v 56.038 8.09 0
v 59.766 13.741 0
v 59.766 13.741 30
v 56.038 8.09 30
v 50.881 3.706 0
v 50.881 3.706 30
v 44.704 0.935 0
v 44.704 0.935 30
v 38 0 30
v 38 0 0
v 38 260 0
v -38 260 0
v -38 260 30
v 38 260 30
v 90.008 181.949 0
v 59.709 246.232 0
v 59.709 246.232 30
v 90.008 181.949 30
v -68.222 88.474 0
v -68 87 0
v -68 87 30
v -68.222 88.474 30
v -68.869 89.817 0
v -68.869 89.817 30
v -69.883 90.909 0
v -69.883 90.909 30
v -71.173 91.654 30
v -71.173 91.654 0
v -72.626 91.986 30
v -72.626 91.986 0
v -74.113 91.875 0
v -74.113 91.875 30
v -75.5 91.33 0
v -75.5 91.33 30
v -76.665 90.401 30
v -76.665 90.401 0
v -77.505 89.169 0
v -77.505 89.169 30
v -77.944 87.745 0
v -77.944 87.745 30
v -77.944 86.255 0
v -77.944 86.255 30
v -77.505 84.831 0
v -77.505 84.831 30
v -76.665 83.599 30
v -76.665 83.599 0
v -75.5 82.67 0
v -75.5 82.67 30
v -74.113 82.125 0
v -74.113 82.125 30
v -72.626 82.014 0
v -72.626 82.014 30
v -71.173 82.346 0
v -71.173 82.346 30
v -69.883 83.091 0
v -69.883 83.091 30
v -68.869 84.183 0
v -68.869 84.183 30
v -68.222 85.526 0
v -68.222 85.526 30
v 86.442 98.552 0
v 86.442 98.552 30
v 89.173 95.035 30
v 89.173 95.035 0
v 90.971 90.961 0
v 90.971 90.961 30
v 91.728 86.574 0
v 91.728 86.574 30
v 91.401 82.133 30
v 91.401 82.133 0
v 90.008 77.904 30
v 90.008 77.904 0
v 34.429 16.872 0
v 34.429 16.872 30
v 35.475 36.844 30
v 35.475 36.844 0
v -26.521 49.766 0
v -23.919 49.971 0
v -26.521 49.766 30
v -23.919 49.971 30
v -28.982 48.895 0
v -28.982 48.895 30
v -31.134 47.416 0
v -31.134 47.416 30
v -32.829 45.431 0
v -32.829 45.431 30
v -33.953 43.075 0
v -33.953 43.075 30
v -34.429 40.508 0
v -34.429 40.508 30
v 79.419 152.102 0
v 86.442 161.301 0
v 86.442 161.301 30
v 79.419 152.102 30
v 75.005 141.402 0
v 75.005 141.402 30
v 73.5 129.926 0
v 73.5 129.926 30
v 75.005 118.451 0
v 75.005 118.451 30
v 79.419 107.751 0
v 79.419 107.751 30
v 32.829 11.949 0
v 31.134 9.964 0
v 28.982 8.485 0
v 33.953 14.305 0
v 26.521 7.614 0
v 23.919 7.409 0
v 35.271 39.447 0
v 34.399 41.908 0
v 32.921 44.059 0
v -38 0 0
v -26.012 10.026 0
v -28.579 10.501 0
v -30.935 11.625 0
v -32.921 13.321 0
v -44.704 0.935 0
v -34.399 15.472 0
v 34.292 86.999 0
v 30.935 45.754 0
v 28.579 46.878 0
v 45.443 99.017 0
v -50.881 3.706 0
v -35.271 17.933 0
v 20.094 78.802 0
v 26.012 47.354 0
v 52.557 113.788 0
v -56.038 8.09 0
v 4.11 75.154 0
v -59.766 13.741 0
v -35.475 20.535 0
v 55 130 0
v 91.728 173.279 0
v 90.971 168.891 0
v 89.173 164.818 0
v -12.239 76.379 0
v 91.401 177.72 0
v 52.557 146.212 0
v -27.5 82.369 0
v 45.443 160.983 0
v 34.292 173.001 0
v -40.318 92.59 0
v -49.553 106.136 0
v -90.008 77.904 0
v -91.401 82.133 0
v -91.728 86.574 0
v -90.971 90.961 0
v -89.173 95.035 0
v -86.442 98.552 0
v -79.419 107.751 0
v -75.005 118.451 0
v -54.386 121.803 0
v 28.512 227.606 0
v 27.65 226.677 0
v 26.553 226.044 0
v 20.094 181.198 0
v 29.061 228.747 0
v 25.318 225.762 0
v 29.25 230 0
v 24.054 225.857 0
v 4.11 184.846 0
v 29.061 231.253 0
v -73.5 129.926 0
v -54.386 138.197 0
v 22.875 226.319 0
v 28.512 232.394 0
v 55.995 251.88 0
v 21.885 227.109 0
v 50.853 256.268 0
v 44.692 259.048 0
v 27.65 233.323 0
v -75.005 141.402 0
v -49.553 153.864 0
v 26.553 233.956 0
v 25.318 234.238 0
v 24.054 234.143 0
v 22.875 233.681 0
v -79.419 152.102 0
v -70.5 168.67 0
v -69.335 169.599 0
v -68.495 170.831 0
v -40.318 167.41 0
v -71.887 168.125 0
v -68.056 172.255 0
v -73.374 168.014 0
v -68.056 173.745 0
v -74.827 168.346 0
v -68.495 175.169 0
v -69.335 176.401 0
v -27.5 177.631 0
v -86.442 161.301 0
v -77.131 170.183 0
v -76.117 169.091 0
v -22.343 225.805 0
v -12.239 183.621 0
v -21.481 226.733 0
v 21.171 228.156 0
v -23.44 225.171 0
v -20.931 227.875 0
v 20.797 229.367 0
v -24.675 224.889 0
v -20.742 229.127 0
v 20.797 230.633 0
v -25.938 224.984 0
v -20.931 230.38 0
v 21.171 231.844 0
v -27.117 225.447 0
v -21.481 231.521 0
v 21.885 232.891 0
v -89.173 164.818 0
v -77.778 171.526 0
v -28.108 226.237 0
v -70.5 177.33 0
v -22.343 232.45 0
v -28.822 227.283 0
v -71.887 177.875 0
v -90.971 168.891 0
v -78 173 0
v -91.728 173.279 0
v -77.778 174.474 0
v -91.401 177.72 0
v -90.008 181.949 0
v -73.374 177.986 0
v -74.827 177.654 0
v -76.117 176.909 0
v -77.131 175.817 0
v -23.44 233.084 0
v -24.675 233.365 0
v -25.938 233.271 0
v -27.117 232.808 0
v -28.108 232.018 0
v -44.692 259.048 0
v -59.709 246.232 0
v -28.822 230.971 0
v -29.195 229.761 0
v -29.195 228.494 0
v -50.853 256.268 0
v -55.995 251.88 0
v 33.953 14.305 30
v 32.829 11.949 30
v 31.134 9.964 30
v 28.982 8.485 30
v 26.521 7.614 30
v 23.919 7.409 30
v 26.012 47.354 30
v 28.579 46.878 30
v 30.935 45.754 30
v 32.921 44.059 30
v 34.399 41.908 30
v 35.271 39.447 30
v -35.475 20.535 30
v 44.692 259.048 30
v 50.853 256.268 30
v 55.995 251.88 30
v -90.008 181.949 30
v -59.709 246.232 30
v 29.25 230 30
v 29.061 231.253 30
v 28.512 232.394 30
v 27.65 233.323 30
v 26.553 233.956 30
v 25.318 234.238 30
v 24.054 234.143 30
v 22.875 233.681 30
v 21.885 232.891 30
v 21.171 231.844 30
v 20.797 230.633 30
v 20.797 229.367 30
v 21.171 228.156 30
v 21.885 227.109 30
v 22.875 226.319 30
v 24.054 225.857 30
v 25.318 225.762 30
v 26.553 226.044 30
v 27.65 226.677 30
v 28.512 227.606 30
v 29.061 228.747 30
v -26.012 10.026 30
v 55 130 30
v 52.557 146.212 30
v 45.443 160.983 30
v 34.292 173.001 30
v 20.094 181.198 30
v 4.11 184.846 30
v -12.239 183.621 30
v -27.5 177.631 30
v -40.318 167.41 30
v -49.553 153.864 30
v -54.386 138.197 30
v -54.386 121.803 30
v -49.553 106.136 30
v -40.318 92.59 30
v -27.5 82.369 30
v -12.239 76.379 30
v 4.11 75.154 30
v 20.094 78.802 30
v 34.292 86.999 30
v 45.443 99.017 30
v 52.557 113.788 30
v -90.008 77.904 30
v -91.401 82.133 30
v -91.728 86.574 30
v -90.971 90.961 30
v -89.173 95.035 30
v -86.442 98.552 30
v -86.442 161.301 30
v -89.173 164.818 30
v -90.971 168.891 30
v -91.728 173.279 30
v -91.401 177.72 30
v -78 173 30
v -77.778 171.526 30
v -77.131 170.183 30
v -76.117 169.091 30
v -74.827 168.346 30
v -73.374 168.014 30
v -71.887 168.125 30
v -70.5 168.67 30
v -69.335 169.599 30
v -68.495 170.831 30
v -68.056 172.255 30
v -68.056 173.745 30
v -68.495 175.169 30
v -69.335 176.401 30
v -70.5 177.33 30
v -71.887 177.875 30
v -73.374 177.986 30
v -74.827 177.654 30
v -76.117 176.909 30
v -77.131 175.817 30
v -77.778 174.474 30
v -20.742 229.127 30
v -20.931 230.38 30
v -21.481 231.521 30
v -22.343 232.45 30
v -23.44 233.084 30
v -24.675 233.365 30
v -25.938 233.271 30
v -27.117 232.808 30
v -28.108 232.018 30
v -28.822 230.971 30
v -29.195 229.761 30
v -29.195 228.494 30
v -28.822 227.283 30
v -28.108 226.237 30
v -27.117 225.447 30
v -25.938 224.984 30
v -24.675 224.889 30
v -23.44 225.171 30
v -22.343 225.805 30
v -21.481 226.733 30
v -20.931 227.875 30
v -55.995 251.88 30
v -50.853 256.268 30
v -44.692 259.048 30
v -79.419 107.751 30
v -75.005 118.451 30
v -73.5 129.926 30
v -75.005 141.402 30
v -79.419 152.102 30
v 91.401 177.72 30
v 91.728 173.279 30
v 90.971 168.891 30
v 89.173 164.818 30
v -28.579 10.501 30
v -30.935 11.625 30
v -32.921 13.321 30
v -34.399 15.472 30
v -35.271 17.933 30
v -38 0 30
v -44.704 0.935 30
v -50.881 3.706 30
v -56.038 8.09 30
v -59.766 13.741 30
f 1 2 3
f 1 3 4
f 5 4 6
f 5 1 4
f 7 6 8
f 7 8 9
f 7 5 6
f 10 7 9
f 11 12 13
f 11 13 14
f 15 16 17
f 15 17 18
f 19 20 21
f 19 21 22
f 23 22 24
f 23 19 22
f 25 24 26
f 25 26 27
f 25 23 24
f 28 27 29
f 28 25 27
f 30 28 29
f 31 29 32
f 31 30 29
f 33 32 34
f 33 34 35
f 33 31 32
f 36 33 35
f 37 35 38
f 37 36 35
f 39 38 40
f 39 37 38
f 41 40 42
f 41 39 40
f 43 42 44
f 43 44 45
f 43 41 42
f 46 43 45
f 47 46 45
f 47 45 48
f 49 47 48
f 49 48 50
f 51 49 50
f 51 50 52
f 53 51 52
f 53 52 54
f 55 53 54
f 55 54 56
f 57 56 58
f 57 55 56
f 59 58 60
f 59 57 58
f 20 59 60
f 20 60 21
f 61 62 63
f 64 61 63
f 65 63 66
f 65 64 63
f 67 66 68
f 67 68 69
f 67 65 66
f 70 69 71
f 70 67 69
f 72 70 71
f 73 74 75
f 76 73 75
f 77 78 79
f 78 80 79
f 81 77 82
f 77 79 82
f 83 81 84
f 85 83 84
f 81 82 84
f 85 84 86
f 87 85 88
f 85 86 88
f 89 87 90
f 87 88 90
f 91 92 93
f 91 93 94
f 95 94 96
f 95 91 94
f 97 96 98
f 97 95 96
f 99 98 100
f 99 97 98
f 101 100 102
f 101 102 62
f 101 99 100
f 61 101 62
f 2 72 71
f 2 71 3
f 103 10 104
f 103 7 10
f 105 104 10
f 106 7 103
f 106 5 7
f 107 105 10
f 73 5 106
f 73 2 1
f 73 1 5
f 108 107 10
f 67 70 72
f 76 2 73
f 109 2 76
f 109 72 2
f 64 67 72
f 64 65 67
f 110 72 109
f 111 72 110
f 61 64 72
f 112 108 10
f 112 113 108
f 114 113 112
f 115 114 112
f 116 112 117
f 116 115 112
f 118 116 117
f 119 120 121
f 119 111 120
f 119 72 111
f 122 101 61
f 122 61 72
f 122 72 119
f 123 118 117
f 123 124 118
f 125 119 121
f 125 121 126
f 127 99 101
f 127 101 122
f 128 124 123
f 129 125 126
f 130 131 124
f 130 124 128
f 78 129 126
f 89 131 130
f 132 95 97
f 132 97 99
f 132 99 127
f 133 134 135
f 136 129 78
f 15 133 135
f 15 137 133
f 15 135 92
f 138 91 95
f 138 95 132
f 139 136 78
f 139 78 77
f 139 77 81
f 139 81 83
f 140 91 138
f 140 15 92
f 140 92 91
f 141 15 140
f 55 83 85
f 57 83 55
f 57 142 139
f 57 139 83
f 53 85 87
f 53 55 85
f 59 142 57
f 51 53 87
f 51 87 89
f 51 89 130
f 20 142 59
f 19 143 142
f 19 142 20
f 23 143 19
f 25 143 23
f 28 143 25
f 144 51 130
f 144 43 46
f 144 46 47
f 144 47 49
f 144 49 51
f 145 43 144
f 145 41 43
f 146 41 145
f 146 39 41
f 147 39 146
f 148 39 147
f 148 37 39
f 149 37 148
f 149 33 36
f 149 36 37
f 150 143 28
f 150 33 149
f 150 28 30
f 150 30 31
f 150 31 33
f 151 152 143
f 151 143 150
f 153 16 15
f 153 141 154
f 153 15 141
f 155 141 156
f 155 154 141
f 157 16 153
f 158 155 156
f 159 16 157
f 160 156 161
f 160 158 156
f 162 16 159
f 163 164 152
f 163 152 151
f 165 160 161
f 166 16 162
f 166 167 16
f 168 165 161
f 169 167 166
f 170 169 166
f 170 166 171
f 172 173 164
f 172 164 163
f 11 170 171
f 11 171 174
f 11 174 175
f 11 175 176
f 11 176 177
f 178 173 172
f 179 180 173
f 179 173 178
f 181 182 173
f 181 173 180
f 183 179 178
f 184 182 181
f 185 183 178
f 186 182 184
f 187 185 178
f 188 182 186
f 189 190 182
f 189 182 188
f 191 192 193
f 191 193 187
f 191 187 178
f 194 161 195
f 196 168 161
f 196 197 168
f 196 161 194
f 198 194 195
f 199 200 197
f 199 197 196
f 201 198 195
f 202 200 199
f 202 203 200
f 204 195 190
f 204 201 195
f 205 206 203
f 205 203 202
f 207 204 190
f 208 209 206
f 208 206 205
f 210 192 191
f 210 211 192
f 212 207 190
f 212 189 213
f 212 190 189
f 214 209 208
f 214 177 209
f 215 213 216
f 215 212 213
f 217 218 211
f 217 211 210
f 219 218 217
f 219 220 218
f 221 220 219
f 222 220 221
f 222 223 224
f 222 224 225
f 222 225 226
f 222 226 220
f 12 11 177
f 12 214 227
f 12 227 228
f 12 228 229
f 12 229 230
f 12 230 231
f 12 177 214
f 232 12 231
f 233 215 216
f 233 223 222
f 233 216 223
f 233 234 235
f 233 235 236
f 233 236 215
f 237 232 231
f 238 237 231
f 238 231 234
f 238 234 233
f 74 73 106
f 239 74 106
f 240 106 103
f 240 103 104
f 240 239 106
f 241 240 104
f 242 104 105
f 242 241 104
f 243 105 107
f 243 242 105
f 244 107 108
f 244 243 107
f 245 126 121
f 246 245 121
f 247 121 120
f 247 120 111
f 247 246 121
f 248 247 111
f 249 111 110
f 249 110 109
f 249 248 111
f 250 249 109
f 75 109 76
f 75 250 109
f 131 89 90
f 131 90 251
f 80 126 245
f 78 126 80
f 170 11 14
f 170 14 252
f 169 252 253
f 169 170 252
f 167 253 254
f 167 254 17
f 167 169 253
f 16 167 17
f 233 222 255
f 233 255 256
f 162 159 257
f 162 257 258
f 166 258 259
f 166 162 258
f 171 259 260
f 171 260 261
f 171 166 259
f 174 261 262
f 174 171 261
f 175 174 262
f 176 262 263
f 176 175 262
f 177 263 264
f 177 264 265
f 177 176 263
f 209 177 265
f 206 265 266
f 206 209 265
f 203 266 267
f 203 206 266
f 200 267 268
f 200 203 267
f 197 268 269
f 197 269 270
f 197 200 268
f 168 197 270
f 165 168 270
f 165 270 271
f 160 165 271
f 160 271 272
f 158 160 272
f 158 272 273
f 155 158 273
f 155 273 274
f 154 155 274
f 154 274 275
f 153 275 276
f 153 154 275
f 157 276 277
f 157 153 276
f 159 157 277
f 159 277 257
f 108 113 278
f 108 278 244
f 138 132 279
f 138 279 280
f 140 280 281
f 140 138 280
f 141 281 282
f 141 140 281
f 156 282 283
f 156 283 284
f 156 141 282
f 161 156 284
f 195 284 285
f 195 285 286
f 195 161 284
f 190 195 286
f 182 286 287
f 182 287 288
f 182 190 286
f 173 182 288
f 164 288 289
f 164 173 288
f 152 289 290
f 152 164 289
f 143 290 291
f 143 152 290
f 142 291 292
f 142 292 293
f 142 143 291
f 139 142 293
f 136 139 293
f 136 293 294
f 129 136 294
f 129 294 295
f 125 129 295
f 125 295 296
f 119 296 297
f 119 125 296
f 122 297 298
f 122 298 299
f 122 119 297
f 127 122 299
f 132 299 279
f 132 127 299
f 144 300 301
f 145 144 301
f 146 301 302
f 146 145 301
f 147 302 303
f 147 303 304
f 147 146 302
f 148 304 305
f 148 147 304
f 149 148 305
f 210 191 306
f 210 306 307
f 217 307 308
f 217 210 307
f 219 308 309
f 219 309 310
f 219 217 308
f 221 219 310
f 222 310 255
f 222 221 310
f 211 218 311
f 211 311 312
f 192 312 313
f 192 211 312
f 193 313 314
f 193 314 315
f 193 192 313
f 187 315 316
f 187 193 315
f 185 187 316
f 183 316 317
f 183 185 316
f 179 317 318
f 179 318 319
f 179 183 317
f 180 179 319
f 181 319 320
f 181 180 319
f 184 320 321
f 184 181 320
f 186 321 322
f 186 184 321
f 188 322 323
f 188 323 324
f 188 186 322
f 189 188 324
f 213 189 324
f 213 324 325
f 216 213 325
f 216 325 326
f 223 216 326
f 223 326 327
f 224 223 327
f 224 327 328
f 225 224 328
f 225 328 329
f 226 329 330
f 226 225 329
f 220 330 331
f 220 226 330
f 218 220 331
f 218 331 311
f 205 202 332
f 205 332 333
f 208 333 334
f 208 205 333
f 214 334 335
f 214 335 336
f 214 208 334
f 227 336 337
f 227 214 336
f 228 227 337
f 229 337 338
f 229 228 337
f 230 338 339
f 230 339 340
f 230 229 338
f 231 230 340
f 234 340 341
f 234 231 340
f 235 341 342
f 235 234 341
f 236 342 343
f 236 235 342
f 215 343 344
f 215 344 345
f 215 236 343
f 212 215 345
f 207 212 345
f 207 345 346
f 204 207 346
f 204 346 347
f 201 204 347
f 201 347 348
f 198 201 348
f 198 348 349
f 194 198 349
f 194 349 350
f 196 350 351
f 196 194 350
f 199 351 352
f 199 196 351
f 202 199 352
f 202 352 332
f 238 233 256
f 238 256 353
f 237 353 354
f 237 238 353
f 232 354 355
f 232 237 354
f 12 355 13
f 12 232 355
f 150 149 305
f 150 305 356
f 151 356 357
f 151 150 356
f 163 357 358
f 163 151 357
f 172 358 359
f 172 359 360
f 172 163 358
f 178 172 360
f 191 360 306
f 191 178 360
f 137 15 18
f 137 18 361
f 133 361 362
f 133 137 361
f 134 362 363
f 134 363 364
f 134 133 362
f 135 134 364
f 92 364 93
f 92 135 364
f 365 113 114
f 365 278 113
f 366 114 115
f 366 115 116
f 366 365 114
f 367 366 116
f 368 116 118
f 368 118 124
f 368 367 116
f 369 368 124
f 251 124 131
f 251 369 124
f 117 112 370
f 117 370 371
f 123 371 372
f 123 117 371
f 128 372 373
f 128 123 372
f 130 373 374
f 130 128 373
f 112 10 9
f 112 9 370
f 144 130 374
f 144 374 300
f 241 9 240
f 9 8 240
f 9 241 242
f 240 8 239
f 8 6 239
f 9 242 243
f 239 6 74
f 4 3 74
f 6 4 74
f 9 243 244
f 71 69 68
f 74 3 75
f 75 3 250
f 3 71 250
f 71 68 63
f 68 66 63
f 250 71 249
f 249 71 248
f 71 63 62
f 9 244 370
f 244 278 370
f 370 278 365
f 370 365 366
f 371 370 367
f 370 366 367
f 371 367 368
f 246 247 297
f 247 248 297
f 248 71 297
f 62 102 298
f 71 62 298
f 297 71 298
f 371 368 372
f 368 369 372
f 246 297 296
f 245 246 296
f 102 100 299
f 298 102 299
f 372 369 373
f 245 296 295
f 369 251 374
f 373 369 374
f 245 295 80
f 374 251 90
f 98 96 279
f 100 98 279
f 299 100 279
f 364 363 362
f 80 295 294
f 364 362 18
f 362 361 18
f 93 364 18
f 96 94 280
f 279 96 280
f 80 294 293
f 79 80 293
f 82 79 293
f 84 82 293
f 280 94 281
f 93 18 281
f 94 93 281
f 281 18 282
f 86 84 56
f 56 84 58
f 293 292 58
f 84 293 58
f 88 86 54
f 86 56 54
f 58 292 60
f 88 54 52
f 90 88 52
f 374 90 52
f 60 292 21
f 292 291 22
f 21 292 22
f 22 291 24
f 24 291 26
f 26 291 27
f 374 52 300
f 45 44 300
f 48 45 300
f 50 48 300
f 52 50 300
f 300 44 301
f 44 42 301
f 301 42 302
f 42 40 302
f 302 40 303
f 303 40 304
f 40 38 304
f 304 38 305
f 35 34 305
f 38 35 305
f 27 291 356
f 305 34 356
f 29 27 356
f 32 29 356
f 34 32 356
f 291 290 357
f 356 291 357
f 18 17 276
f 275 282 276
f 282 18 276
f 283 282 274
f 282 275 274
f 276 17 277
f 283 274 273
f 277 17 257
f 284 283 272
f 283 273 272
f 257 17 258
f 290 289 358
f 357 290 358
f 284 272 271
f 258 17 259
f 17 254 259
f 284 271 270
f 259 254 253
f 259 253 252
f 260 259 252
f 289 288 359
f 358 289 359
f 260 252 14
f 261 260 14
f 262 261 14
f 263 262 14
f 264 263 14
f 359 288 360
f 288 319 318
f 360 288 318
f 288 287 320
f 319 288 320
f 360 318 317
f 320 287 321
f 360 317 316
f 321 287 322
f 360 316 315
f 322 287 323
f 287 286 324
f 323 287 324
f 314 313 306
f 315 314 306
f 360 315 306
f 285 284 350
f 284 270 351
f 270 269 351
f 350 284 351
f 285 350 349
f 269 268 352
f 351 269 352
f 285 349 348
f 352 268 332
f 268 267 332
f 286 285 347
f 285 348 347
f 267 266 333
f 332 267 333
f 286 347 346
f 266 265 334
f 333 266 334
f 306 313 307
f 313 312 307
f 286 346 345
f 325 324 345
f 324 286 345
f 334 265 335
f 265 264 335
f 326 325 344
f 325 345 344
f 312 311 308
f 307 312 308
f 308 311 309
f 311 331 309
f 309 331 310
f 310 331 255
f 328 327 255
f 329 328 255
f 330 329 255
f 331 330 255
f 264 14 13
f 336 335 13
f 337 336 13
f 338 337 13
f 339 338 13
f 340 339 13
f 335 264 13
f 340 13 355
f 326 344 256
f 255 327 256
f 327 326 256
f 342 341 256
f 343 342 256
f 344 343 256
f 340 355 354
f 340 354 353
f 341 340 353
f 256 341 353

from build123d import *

# Parameters (mm, degrees)
SZKIC1_R                    = 55
SZKIC1_R_2                  = 5
SZKIC1_R_3                  = 4.25
DODANIE_WYCI_GNI_CIE1_DEPTH = 30
WYTNIJ_WYCI_GNI_CIE1_DEPTH  = 30
ZAOKR_GLENIE1_R             = 10


with BuildPart() as part:
    # Szkic1 → Dodanie-wyciągnięcie1 (new body)
    with BuildSketch(Plane.XY):
        with BuildLine():
            Line((-38, 260), (38, 260))
            ThreePointArc((38, 260), (50.853486978, 256.267902519), (59.709435091, 246.232322709))
            Line((59.709435091, 246.232322709), (90.008216267, 181.948831851))
            ThreePointArc((90.008216267, 181.948831851), (91.483769879, 171.062118236), (86.44222441, 161.300939461))
            ThreePointArc((86.44222441, 161.300939461), (73.499977081, 129.92645546), (86.44222441, 98.551971459))
            ThreePointArc((86.44222441, 98.551971459), (91.483769879, 88.790792684), (90.008216267, 77.904079069))
            Line((90.008216267, 77.904079069), (59.766160901, 13.740940677))
            ThreePointArc((59.766160901, 13.740940677), (50.88106069, 3.705595357), (38, 0))
            Line((38, 0), (0, 0))
            Line((0, 0), (-38, 0))
            ThreePointArc((-38, 0), (-50.88106069, 3.705595357), (-59.766160901, 13.740940677))
            Line((-59.766160901, 13.740940677), (-90.008216267, 77.904079069))
            ThreePointArc((-90.008216267, 77.904079069), (-91.483769879, 88.790792684), (-86.44222441, 98.551971459))
            ThreePointArc((-86.44222441, 98.551971459), (-73.499977081, 129.92645546), (-86.44222441, 161.300939461))
            ThreePointArc((-86.44222441, 161.300939461), (-91.483769879, 171.062118236), (-90.008216267, 181.948831851))
            Line((-90.008216267, 181.948831851), (-59.709435091, 246.232322709))
            ThreePointArc((-59.709435091, 246.232322709), (-50.853486978, 256.267902519), (-38, 260))
        make_face()
        with Locations((0, 130)):
            Circle(SZKIC1_R, mode=Mode.SUBTRACT)
        with Locations((-73, 87)):
            Circle(SZKIC1_R_2, mode=Mode.SUBTRACT)
        with Locations(Location((-73, 173, 0), (0, 0, 180))):
            Circle(SZKIC1_R_2, mode=Mode.SUBTRACT)
        with Locations((25, 230)):
            Circle(SZKIC1_R_3, mode=Mode.SUBTRACT)
        with Locations((-24.992384758, 229.127379678)):
            Circle(SZKIC1_R_3, mode=Mode.SUBTRACT)
        with Locations((-25, 30)):
            Circle(SZKIC1_R_3, mode=Mode.SUBTRACT)
        with Locations((24.931476738, 27.383202188)):
            Circle(SZKIC1_R_3, mode=Mode.SUBTRACT)
    extrude(amount=DODANIE_WYCI_GNI_CIE1_DEPTH)

    # Szkic4 → Wytnij-wyciągnięcie1 (cut)
    with BuildSketch(Plane(origin=(-86.44222441, 98.551971459, 0), x_dir=(-1, 0, 0), z_dir=(0, 0, -1))):
        Polygon((-52.536909819, -48.057816777), (-50.443471569, -88.002998167), (-120.347539002, -91.666515104), (-122.440977251, -51.721333714), align=None)
    extrude(amount=-WYTNIJ_WYCI_GNI_CIE1_DEPTH, mode=Mode.SUBTRACT)

    # Zaokrąglenie1
    zaokr_glenie1_edges = [part.edges().sort_by_distance(p)[0] for p in [
        (35.998752841, 46.830637745, 15),
        (-33.905314592, 50.494154682, 15),
        (-35.998752841, 10.548973291, 15),
        (33.905314592, 6.885456354, 15),
    ]]
    fillet(zaokr_glenie1_edges, radius=ZAOKR_GLENIE1_R)


solid = part.part
